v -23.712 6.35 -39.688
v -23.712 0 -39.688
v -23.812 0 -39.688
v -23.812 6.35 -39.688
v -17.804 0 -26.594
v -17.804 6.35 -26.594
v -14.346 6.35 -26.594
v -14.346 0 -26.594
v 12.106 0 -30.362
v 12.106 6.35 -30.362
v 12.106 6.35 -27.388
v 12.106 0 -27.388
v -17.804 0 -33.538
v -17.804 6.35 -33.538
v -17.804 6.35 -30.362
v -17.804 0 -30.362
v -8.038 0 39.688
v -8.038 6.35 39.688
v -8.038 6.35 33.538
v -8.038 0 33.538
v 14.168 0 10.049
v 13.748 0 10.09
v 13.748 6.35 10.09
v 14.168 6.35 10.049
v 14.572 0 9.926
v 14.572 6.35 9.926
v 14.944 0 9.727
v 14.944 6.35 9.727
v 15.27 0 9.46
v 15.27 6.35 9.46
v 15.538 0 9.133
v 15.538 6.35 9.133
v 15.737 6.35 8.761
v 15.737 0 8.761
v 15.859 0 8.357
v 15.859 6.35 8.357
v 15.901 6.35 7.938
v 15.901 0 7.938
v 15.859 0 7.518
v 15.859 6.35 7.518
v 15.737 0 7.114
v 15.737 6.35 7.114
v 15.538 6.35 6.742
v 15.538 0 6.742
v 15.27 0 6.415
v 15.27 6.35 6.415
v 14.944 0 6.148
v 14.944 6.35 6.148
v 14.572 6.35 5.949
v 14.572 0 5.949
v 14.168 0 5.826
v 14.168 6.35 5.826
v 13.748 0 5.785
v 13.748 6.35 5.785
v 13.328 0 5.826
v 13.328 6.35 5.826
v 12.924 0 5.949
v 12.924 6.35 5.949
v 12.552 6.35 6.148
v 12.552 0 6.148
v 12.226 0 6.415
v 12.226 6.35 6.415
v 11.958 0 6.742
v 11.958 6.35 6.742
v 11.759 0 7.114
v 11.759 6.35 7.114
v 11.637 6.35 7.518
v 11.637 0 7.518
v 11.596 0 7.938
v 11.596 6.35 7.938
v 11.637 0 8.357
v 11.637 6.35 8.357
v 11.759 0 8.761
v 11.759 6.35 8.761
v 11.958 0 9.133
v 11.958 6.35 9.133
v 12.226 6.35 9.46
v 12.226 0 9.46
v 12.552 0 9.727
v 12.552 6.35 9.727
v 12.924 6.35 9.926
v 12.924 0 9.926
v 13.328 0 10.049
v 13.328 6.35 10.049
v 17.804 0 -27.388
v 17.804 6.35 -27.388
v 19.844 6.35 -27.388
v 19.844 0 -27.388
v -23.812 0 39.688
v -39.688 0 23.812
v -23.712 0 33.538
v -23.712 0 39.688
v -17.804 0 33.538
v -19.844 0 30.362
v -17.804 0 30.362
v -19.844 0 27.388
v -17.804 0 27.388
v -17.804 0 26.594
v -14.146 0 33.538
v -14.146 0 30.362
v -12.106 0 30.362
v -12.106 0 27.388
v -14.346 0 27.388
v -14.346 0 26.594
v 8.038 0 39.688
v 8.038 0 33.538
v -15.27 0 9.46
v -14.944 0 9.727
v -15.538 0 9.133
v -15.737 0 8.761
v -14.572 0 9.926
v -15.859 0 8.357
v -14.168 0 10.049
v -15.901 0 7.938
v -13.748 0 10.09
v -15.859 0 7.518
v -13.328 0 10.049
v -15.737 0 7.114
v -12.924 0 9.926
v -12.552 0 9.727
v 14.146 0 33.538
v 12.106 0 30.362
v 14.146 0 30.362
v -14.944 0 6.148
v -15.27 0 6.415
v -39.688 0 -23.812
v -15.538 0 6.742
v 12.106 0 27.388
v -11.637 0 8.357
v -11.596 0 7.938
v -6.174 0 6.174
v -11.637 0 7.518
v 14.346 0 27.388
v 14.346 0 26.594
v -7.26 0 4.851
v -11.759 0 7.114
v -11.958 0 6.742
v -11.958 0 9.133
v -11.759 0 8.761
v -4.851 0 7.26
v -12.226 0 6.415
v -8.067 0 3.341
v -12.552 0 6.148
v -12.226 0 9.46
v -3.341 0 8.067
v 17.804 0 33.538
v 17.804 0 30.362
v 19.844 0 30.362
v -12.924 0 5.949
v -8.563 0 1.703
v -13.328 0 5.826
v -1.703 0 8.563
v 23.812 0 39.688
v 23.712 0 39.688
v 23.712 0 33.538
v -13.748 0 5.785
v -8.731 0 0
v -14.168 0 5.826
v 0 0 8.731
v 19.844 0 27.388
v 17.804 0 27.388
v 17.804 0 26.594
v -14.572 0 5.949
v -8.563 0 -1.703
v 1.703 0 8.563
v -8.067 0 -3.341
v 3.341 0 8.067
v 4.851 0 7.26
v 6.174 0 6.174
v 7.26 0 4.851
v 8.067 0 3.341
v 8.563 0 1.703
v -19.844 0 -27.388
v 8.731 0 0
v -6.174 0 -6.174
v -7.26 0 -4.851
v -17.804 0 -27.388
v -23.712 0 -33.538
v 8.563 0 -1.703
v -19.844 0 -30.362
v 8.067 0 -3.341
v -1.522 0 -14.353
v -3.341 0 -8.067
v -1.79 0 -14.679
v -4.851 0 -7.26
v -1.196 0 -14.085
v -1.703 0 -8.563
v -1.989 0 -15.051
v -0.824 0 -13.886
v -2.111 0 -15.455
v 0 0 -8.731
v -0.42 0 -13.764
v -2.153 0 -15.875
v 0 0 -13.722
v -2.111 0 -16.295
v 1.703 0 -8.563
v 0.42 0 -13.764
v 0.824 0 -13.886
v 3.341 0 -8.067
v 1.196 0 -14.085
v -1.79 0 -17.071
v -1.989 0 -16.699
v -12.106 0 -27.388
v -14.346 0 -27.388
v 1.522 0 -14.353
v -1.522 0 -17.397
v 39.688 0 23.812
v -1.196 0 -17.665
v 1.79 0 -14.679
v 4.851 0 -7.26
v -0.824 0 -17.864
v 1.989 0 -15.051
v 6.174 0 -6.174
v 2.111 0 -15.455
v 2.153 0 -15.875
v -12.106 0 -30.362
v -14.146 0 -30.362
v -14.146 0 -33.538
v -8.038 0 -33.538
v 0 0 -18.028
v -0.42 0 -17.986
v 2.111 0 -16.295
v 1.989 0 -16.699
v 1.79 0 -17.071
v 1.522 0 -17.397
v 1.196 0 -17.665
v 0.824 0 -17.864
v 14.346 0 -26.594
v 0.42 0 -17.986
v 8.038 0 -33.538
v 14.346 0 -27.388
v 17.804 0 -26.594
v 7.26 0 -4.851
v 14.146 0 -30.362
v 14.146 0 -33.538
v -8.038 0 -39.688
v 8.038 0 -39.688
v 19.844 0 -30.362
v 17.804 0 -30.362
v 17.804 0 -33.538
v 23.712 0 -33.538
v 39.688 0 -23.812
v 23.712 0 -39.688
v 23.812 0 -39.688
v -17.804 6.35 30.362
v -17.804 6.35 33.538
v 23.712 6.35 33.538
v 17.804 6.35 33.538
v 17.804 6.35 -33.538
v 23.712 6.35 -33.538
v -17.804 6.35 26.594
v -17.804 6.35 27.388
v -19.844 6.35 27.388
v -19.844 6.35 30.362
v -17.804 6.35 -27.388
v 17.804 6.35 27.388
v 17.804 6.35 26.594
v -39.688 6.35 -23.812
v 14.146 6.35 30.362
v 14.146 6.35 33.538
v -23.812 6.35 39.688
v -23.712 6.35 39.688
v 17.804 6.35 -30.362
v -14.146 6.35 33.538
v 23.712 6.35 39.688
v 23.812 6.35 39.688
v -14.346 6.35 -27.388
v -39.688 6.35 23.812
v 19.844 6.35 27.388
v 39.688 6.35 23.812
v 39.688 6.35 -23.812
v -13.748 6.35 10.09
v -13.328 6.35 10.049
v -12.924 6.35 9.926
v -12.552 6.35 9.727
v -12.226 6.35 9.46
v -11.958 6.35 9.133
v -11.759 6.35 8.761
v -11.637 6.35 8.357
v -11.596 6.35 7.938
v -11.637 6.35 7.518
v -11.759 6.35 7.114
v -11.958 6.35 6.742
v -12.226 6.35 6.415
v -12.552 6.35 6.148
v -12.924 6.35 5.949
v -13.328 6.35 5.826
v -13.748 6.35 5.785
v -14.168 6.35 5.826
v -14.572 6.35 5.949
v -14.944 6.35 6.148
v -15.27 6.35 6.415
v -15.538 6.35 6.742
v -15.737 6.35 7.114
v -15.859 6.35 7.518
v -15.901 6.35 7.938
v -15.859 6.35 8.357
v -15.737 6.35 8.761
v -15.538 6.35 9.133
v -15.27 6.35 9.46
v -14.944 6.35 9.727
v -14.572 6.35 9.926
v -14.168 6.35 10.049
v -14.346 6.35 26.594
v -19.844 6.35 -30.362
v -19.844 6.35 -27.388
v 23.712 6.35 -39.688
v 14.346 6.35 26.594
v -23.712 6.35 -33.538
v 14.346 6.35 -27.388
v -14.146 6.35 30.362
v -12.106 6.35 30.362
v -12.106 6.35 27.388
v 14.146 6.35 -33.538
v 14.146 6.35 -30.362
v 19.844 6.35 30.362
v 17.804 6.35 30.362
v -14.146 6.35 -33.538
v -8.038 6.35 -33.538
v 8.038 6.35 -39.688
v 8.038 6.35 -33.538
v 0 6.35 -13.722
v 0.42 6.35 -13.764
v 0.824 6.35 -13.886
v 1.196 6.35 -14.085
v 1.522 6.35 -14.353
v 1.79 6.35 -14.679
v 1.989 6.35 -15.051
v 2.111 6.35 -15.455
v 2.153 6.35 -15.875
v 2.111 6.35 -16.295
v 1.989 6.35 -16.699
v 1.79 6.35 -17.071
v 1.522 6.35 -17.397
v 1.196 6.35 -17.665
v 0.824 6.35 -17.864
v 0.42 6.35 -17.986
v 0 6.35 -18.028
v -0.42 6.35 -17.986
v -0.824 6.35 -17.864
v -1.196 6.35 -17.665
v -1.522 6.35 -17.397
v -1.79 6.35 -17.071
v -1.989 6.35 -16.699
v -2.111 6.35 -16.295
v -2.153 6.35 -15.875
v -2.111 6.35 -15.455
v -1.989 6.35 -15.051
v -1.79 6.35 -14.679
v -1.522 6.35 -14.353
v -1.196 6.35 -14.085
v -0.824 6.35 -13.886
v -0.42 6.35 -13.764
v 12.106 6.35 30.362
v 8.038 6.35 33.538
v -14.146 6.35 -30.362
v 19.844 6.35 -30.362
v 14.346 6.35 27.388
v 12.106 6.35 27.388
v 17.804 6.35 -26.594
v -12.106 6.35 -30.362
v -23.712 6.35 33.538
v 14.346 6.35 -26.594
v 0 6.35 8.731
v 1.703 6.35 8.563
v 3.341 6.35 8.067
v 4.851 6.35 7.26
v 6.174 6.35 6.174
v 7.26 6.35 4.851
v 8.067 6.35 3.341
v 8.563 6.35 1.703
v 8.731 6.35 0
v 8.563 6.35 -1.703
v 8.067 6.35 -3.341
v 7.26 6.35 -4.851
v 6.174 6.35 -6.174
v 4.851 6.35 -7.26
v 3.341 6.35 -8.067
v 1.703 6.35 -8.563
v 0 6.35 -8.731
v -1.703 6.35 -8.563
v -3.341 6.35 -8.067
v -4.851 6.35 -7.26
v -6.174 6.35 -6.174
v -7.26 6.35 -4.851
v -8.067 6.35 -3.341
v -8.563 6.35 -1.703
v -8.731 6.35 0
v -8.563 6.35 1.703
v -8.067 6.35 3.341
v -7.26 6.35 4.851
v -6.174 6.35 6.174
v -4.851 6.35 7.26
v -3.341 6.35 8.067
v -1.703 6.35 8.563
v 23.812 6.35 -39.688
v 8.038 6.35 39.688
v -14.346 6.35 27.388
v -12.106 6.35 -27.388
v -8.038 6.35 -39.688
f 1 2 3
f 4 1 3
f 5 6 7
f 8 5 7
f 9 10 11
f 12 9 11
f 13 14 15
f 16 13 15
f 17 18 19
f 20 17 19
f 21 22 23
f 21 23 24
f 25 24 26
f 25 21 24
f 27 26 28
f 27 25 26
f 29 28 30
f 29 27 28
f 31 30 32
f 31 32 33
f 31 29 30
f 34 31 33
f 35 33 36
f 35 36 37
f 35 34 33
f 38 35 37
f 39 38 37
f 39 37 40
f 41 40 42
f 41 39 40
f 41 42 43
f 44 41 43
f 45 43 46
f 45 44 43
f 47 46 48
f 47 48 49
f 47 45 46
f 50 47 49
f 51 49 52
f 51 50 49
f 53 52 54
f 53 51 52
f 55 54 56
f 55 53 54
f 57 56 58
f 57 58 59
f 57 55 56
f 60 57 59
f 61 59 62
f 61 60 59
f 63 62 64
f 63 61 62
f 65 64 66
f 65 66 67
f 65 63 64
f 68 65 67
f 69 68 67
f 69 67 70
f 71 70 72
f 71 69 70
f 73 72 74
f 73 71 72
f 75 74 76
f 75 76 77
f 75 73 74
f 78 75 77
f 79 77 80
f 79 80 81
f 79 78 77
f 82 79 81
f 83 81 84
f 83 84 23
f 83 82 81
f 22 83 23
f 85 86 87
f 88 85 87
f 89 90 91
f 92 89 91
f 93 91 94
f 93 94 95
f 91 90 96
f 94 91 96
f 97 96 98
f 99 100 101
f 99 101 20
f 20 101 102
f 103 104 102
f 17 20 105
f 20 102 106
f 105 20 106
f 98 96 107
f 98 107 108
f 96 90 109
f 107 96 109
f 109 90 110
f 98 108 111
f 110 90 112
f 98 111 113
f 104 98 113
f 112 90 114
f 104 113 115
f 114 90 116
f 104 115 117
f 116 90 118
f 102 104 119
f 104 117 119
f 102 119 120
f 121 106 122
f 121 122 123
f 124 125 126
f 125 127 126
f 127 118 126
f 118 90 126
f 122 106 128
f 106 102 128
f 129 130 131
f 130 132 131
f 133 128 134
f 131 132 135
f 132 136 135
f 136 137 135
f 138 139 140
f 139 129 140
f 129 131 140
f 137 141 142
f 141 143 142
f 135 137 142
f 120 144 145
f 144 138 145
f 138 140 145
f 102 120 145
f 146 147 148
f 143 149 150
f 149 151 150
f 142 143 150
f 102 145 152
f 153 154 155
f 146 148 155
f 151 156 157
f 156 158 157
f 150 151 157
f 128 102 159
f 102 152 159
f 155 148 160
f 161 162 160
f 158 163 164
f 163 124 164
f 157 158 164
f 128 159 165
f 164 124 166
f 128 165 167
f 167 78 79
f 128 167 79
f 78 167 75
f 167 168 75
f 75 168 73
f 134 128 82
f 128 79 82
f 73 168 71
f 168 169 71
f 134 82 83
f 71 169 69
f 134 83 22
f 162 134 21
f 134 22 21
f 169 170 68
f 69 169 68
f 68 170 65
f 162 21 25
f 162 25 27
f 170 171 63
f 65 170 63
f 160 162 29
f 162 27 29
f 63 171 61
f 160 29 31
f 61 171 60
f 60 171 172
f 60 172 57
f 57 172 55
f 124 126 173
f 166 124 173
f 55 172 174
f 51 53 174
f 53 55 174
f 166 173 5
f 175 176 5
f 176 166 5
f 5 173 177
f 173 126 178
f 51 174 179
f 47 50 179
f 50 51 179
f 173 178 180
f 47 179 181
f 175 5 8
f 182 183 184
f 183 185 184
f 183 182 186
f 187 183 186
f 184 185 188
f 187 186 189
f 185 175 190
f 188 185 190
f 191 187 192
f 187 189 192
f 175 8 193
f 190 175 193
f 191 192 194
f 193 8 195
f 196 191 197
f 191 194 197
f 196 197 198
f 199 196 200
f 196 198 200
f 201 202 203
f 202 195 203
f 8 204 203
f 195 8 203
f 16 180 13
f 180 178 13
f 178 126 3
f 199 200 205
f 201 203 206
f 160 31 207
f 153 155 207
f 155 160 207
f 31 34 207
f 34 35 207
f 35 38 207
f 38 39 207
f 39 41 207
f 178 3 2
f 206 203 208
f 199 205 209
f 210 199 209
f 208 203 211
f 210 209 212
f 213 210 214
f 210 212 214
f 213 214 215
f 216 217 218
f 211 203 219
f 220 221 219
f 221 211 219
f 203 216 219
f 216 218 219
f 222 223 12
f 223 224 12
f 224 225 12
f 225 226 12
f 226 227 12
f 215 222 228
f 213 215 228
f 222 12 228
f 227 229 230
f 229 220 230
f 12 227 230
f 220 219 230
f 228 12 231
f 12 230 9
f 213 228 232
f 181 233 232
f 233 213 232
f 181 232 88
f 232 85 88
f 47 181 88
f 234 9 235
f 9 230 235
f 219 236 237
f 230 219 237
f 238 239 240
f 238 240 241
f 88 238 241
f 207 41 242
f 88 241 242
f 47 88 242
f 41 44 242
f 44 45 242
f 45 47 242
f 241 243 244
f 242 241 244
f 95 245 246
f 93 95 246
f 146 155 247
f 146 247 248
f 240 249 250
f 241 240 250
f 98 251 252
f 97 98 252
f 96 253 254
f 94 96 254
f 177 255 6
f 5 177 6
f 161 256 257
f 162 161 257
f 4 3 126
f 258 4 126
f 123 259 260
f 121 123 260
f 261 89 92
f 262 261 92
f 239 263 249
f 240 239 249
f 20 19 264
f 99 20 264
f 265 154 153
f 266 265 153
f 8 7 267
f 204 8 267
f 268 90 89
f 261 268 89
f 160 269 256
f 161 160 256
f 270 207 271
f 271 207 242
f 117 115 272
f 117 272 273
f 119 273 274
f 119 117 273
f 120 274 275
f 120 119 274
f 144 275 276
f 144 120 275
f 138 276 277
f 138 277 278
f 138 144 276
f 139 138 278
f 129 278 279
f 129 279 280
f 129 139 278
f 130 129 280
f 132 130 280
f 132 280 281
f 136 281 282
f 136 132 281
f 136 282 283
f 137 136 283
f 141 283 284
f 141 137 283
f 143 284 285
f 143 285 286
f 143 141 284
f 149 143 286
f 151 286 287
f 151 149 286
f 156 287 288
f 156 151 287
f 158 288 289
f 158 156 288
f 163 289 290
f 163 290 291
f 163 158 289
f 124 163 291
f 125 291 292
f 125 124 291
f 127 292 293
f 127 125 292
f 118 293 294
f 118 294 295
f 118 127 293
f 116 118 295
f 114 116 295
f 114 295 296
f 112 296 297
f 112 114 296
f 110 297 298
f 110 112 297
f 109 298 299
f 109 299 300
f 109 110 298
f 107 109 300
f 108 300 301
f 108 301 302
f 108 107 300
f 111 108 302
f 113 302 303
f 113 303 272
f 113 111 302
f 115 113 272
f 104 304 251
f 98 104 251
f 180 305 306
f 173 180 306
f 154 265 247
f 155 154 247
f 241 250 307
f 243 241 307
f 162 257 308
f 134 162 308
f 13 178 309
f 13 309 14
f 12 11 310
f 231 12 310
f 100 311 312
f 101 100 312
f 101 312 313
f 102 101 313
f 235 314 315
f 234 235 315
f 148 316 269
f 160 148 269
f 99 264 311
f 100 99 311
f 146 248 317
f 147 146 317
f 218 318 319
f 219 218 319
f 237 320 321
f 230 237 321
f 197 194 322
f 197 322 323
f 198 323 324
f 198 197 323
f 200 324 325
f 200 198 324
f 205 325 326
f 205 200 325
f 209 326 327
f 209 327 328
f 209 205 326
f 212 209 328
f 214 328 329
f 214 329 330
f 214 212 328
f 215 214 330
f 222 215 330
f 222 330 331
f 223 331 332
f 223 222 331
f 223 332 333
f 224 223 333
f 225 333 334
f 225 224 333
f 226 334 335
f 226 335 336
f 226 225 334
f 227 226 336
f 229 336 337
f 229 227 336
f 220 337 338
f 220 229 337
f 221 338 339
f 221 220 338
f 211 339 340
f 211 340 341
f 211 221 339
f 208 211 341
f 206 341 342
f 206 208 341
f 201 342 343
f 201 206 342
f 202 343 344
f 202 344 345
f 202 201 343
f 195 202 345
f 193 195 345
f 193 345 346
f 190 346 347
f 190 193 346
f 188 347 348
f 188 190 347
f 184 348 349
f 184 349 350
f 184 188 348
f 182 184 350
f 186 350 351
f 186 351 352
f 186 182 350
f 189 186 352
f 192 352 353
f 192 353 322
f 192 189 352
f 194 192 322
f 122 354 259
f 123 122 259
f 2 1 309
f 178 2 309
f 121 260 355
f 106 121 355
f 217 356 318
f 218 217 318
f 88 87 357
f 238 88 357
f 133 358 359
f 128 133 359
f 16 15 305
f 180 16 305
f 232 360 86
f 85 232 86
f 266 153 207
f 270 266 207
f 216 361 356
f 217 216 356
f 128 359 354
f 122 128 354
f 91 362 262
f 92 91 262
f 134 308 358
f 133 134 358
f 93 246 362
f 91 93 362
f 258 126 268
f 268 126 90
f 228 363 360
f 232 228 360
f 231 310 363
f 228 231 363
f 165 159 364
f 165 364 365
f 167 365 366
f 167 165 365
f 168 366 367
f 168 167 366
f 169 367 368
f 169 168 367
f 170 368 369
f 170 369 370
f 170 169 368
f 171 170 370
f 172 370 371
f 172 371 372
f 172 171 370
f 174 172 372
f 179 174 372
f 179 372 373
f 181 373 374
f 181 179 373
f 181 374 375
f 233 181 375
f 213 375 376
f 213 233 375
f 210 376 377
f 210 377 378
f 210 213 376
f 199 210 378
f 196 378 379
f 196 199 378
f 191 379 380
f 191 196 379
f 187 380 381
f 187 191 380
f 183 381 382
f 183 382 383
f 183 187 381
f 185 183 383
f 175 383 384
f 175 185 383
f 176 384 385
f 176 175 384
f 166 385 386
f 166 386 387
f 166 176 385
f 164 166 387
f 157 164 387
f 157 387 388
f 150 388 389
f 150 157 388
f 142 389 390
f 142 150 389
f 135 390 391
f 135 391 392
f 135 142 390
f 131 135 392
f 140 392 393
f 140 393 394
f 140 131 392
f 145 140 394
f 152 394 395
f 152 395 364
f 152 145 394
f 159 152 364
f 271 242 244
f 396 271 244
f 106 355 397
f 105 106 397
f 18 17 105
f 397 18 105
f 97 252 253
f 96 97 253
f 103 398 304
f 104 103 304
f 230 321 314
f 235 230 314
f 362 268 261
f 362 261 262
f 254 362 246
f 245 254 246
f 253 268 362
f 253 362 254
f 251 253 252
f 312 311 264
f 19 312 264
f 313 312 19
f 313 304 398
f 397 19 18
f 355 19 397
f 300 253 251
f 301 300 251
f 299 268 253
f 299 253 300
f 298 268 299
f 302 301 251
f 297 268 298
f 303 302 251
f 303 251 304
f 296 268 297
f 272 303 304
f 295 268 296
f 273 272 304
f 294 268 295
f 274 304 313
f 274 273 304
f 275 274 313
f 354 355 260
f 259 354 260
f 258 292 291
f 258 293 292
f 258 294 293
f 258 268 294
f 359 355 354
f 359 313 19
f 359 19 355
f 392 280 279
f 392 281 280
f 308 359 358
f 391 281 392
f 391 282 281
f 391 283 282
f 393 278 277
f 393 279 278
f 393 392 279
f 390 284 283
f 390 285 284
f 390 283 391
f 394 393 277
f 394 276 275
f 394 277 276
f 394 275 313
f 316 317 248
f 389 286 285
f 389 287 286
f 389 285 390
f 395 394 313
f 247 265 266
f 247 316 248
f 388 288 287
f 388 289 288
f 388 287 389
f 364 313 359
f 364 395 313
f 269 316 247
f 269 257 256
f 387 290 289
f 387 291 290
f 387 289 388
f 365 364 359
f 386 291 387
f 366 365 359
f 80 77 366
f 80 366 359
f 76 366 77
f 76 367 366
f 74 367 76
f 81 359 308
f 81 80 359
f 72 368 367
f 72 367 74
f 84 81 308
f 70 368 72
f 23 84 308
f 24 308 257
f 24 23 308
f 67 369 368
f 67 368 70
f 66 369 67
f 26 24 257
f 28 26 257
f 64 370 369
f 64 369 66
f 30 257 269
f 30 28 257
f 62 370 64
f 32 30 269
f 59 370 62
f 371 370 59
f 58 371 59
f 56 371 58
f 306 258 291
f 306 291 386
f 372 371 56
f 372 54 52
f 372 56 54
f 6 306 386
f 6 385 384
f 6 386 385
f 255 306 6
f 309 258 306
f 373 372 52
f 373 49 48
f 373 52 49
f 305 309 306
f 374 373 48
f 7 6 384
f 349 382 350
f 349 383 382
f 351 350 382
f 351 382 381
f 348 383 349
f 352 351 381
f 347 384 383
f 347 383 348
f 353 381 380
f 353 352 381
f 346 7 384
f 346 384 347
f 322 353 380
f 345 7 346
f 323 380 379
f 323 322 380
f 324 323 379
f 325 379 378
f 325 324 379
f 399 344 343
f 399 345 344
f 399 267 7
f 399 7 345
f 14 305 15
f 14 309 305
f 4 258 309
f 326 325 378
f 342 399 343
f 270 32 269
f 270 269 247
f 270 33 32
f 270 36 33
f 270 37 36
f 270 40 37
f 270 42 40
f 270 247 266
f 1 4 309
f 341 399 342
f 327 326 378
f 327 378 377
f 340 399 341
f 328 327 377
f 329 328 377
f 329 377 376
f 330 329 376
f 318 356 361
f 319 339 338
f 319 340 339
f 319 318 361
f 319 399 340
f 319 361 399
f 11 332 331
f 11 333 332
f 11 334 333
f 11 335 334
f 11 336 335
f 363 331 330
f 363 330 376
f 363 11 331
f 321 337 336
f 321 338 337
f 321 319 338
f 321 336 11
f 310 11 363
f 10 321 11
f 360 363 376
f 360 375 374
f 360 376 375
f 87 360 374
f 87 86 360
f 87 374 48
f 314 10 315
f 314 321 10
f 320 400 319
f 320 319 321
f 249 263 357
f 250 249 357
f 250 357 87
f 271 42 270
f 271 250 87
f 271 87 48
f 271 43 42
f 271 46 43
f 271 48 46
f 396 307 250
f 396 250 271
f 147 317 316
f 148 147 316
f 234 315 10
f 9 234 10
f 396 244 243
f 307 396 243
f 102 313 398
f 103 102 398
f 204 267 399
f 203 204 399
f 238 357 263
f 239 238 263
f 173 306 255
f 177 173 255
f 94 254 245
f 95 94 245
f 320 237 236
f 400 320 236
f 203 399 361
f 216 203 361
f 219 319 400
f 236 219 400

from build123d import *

# Parameters (mm, degrees)
SKETCH1_R           = 2.15265
SKETCH1_R_2         = 8.73125
BOSS_EXTRUDE1_DEPTH = 6.35
CUT_EXTRUDE1_DEPTH  = 57.484668827


with BuildPart() as part:
    # Sketch1 → Boss-Extrude1 (new body)
    with BuildSketch(Plane(origin=(0, 0, 0), x_dir=(1, 0, 0), z_dir=(0, 1, 0))):
        Polygon((23.8125, 39.6875), (-23.8125, 39.6875), (-39.6875, 23.8125), (-39.6875, -23.8125), (-23.8125, -39.6875), (23.8125, -39.6875), (39.6875, -23.8125), (39.6875, 23.8125), align=None)
        with Locations(Location((-13.748153285, -7.9375, 0), (0, 0, 270))):
            Circle(SKETCH1_R, mode=Mode.SUBTRACT)
        with Locations(Location((13.748153285, -7.9375, 0), (0, 0, 270))):
            Circle(SKETCH1_R, mode=Mode.SUBTRACT)
        with Locations(Location((0, 0, 0), (0, 0, 270))):
            Circle(SKETCH1_R_2, mode=Mode.SUBTRACT)
        with Locations(Location((0, 15.875, 0), (0, 0, 270))):
            Circle(SKETCH1_R, mode=Mode.SUBTRACT)
    extrude(amount=BOSS_EXTRUDE1_DEPTH)

    # Sketch2 → Cut-Extrude1 (cut, through all)
    with BuildSketch(Plane(origin=(0, 6.35, 0), x_dir=(1, 0, 0), z_dir=(0, 1, 0))):
        Polygon((-8.0375, 39.6875), (-23.7125, 39.6875), (-23.7125, 33.5375), (-17.8038, 33.5375), (-17.8038, 30.3625), (-19.84375, 30.3625), (-19.84375, 27.3875), (-17.8038, 27.3875), (-17.8038, 26.59375), (-14.3462, 26.59375), (-14.3462, 27.3875), (-12.10625, 27.3875), (-12.10625, 30.3625), (-14.1462, 30.3625), (-14.1462, 33.5375), (-8.0375, 33.5375), align=None)
        Polygon((23.7125, 39.6875), (8.0375, 39.6875), (8.0375, 33.5375), (14.1462, 33.5375), (14.1462, 30.3625), (12.10625, 30.3625), (12.10625, 27.3875), (14.3462, 27.3875), (14.3462, 26.59375), (17.8038, 26.59375), (17.8038, 27.3875), (19.84375, 27.3875), (19.84375, 30.3625), (17.8038, 30.3625), (17.8038, 33.5375), (23.7125, 33.5375), align=None)
        Polygon((-23.7125, -33.5375), (-23.7125, -39.6875), (-8.0375, -39.6875), (-8.0375, -33.5375), (-14.1462, -33.5375), (-14.1462, -30.3625), (-12.10625, -30.3625), (-12.10625, -27.3875), (-14.3462, -27.3875), (-14.3462, -26.59375), (-17.8038, -26.59375), (-17.8038, -27.3875), (-19.84375, -27.3875), (-19.84375, -30.3625), (-17.8038, -30.3625), (-17.8038, -33.5375), align=None)
        Polygon((8.0375, -33.5375), (8.0375, -39.6875), (23.7125, -39.6875), (23.7125, -33.5375), (17.8038, -33.5375), (17.8038, -30.3625), (19.84375, -30.3625), (19.84375, -27.3875), (17.8038, -27.3875), (17.8038, -26.59375), (14.3462, -26.59375), (14.3462, -27.3875), (12.10625, -27.3875), (12.10625, -30.3625), (14.1462, -30.3625), (14.1462, -33.5375), align=None)
    extrude(amount=-CUT_EXTRUDE1_DEPTH, mode=Mode.SUBTRACT)


solid = part.part
